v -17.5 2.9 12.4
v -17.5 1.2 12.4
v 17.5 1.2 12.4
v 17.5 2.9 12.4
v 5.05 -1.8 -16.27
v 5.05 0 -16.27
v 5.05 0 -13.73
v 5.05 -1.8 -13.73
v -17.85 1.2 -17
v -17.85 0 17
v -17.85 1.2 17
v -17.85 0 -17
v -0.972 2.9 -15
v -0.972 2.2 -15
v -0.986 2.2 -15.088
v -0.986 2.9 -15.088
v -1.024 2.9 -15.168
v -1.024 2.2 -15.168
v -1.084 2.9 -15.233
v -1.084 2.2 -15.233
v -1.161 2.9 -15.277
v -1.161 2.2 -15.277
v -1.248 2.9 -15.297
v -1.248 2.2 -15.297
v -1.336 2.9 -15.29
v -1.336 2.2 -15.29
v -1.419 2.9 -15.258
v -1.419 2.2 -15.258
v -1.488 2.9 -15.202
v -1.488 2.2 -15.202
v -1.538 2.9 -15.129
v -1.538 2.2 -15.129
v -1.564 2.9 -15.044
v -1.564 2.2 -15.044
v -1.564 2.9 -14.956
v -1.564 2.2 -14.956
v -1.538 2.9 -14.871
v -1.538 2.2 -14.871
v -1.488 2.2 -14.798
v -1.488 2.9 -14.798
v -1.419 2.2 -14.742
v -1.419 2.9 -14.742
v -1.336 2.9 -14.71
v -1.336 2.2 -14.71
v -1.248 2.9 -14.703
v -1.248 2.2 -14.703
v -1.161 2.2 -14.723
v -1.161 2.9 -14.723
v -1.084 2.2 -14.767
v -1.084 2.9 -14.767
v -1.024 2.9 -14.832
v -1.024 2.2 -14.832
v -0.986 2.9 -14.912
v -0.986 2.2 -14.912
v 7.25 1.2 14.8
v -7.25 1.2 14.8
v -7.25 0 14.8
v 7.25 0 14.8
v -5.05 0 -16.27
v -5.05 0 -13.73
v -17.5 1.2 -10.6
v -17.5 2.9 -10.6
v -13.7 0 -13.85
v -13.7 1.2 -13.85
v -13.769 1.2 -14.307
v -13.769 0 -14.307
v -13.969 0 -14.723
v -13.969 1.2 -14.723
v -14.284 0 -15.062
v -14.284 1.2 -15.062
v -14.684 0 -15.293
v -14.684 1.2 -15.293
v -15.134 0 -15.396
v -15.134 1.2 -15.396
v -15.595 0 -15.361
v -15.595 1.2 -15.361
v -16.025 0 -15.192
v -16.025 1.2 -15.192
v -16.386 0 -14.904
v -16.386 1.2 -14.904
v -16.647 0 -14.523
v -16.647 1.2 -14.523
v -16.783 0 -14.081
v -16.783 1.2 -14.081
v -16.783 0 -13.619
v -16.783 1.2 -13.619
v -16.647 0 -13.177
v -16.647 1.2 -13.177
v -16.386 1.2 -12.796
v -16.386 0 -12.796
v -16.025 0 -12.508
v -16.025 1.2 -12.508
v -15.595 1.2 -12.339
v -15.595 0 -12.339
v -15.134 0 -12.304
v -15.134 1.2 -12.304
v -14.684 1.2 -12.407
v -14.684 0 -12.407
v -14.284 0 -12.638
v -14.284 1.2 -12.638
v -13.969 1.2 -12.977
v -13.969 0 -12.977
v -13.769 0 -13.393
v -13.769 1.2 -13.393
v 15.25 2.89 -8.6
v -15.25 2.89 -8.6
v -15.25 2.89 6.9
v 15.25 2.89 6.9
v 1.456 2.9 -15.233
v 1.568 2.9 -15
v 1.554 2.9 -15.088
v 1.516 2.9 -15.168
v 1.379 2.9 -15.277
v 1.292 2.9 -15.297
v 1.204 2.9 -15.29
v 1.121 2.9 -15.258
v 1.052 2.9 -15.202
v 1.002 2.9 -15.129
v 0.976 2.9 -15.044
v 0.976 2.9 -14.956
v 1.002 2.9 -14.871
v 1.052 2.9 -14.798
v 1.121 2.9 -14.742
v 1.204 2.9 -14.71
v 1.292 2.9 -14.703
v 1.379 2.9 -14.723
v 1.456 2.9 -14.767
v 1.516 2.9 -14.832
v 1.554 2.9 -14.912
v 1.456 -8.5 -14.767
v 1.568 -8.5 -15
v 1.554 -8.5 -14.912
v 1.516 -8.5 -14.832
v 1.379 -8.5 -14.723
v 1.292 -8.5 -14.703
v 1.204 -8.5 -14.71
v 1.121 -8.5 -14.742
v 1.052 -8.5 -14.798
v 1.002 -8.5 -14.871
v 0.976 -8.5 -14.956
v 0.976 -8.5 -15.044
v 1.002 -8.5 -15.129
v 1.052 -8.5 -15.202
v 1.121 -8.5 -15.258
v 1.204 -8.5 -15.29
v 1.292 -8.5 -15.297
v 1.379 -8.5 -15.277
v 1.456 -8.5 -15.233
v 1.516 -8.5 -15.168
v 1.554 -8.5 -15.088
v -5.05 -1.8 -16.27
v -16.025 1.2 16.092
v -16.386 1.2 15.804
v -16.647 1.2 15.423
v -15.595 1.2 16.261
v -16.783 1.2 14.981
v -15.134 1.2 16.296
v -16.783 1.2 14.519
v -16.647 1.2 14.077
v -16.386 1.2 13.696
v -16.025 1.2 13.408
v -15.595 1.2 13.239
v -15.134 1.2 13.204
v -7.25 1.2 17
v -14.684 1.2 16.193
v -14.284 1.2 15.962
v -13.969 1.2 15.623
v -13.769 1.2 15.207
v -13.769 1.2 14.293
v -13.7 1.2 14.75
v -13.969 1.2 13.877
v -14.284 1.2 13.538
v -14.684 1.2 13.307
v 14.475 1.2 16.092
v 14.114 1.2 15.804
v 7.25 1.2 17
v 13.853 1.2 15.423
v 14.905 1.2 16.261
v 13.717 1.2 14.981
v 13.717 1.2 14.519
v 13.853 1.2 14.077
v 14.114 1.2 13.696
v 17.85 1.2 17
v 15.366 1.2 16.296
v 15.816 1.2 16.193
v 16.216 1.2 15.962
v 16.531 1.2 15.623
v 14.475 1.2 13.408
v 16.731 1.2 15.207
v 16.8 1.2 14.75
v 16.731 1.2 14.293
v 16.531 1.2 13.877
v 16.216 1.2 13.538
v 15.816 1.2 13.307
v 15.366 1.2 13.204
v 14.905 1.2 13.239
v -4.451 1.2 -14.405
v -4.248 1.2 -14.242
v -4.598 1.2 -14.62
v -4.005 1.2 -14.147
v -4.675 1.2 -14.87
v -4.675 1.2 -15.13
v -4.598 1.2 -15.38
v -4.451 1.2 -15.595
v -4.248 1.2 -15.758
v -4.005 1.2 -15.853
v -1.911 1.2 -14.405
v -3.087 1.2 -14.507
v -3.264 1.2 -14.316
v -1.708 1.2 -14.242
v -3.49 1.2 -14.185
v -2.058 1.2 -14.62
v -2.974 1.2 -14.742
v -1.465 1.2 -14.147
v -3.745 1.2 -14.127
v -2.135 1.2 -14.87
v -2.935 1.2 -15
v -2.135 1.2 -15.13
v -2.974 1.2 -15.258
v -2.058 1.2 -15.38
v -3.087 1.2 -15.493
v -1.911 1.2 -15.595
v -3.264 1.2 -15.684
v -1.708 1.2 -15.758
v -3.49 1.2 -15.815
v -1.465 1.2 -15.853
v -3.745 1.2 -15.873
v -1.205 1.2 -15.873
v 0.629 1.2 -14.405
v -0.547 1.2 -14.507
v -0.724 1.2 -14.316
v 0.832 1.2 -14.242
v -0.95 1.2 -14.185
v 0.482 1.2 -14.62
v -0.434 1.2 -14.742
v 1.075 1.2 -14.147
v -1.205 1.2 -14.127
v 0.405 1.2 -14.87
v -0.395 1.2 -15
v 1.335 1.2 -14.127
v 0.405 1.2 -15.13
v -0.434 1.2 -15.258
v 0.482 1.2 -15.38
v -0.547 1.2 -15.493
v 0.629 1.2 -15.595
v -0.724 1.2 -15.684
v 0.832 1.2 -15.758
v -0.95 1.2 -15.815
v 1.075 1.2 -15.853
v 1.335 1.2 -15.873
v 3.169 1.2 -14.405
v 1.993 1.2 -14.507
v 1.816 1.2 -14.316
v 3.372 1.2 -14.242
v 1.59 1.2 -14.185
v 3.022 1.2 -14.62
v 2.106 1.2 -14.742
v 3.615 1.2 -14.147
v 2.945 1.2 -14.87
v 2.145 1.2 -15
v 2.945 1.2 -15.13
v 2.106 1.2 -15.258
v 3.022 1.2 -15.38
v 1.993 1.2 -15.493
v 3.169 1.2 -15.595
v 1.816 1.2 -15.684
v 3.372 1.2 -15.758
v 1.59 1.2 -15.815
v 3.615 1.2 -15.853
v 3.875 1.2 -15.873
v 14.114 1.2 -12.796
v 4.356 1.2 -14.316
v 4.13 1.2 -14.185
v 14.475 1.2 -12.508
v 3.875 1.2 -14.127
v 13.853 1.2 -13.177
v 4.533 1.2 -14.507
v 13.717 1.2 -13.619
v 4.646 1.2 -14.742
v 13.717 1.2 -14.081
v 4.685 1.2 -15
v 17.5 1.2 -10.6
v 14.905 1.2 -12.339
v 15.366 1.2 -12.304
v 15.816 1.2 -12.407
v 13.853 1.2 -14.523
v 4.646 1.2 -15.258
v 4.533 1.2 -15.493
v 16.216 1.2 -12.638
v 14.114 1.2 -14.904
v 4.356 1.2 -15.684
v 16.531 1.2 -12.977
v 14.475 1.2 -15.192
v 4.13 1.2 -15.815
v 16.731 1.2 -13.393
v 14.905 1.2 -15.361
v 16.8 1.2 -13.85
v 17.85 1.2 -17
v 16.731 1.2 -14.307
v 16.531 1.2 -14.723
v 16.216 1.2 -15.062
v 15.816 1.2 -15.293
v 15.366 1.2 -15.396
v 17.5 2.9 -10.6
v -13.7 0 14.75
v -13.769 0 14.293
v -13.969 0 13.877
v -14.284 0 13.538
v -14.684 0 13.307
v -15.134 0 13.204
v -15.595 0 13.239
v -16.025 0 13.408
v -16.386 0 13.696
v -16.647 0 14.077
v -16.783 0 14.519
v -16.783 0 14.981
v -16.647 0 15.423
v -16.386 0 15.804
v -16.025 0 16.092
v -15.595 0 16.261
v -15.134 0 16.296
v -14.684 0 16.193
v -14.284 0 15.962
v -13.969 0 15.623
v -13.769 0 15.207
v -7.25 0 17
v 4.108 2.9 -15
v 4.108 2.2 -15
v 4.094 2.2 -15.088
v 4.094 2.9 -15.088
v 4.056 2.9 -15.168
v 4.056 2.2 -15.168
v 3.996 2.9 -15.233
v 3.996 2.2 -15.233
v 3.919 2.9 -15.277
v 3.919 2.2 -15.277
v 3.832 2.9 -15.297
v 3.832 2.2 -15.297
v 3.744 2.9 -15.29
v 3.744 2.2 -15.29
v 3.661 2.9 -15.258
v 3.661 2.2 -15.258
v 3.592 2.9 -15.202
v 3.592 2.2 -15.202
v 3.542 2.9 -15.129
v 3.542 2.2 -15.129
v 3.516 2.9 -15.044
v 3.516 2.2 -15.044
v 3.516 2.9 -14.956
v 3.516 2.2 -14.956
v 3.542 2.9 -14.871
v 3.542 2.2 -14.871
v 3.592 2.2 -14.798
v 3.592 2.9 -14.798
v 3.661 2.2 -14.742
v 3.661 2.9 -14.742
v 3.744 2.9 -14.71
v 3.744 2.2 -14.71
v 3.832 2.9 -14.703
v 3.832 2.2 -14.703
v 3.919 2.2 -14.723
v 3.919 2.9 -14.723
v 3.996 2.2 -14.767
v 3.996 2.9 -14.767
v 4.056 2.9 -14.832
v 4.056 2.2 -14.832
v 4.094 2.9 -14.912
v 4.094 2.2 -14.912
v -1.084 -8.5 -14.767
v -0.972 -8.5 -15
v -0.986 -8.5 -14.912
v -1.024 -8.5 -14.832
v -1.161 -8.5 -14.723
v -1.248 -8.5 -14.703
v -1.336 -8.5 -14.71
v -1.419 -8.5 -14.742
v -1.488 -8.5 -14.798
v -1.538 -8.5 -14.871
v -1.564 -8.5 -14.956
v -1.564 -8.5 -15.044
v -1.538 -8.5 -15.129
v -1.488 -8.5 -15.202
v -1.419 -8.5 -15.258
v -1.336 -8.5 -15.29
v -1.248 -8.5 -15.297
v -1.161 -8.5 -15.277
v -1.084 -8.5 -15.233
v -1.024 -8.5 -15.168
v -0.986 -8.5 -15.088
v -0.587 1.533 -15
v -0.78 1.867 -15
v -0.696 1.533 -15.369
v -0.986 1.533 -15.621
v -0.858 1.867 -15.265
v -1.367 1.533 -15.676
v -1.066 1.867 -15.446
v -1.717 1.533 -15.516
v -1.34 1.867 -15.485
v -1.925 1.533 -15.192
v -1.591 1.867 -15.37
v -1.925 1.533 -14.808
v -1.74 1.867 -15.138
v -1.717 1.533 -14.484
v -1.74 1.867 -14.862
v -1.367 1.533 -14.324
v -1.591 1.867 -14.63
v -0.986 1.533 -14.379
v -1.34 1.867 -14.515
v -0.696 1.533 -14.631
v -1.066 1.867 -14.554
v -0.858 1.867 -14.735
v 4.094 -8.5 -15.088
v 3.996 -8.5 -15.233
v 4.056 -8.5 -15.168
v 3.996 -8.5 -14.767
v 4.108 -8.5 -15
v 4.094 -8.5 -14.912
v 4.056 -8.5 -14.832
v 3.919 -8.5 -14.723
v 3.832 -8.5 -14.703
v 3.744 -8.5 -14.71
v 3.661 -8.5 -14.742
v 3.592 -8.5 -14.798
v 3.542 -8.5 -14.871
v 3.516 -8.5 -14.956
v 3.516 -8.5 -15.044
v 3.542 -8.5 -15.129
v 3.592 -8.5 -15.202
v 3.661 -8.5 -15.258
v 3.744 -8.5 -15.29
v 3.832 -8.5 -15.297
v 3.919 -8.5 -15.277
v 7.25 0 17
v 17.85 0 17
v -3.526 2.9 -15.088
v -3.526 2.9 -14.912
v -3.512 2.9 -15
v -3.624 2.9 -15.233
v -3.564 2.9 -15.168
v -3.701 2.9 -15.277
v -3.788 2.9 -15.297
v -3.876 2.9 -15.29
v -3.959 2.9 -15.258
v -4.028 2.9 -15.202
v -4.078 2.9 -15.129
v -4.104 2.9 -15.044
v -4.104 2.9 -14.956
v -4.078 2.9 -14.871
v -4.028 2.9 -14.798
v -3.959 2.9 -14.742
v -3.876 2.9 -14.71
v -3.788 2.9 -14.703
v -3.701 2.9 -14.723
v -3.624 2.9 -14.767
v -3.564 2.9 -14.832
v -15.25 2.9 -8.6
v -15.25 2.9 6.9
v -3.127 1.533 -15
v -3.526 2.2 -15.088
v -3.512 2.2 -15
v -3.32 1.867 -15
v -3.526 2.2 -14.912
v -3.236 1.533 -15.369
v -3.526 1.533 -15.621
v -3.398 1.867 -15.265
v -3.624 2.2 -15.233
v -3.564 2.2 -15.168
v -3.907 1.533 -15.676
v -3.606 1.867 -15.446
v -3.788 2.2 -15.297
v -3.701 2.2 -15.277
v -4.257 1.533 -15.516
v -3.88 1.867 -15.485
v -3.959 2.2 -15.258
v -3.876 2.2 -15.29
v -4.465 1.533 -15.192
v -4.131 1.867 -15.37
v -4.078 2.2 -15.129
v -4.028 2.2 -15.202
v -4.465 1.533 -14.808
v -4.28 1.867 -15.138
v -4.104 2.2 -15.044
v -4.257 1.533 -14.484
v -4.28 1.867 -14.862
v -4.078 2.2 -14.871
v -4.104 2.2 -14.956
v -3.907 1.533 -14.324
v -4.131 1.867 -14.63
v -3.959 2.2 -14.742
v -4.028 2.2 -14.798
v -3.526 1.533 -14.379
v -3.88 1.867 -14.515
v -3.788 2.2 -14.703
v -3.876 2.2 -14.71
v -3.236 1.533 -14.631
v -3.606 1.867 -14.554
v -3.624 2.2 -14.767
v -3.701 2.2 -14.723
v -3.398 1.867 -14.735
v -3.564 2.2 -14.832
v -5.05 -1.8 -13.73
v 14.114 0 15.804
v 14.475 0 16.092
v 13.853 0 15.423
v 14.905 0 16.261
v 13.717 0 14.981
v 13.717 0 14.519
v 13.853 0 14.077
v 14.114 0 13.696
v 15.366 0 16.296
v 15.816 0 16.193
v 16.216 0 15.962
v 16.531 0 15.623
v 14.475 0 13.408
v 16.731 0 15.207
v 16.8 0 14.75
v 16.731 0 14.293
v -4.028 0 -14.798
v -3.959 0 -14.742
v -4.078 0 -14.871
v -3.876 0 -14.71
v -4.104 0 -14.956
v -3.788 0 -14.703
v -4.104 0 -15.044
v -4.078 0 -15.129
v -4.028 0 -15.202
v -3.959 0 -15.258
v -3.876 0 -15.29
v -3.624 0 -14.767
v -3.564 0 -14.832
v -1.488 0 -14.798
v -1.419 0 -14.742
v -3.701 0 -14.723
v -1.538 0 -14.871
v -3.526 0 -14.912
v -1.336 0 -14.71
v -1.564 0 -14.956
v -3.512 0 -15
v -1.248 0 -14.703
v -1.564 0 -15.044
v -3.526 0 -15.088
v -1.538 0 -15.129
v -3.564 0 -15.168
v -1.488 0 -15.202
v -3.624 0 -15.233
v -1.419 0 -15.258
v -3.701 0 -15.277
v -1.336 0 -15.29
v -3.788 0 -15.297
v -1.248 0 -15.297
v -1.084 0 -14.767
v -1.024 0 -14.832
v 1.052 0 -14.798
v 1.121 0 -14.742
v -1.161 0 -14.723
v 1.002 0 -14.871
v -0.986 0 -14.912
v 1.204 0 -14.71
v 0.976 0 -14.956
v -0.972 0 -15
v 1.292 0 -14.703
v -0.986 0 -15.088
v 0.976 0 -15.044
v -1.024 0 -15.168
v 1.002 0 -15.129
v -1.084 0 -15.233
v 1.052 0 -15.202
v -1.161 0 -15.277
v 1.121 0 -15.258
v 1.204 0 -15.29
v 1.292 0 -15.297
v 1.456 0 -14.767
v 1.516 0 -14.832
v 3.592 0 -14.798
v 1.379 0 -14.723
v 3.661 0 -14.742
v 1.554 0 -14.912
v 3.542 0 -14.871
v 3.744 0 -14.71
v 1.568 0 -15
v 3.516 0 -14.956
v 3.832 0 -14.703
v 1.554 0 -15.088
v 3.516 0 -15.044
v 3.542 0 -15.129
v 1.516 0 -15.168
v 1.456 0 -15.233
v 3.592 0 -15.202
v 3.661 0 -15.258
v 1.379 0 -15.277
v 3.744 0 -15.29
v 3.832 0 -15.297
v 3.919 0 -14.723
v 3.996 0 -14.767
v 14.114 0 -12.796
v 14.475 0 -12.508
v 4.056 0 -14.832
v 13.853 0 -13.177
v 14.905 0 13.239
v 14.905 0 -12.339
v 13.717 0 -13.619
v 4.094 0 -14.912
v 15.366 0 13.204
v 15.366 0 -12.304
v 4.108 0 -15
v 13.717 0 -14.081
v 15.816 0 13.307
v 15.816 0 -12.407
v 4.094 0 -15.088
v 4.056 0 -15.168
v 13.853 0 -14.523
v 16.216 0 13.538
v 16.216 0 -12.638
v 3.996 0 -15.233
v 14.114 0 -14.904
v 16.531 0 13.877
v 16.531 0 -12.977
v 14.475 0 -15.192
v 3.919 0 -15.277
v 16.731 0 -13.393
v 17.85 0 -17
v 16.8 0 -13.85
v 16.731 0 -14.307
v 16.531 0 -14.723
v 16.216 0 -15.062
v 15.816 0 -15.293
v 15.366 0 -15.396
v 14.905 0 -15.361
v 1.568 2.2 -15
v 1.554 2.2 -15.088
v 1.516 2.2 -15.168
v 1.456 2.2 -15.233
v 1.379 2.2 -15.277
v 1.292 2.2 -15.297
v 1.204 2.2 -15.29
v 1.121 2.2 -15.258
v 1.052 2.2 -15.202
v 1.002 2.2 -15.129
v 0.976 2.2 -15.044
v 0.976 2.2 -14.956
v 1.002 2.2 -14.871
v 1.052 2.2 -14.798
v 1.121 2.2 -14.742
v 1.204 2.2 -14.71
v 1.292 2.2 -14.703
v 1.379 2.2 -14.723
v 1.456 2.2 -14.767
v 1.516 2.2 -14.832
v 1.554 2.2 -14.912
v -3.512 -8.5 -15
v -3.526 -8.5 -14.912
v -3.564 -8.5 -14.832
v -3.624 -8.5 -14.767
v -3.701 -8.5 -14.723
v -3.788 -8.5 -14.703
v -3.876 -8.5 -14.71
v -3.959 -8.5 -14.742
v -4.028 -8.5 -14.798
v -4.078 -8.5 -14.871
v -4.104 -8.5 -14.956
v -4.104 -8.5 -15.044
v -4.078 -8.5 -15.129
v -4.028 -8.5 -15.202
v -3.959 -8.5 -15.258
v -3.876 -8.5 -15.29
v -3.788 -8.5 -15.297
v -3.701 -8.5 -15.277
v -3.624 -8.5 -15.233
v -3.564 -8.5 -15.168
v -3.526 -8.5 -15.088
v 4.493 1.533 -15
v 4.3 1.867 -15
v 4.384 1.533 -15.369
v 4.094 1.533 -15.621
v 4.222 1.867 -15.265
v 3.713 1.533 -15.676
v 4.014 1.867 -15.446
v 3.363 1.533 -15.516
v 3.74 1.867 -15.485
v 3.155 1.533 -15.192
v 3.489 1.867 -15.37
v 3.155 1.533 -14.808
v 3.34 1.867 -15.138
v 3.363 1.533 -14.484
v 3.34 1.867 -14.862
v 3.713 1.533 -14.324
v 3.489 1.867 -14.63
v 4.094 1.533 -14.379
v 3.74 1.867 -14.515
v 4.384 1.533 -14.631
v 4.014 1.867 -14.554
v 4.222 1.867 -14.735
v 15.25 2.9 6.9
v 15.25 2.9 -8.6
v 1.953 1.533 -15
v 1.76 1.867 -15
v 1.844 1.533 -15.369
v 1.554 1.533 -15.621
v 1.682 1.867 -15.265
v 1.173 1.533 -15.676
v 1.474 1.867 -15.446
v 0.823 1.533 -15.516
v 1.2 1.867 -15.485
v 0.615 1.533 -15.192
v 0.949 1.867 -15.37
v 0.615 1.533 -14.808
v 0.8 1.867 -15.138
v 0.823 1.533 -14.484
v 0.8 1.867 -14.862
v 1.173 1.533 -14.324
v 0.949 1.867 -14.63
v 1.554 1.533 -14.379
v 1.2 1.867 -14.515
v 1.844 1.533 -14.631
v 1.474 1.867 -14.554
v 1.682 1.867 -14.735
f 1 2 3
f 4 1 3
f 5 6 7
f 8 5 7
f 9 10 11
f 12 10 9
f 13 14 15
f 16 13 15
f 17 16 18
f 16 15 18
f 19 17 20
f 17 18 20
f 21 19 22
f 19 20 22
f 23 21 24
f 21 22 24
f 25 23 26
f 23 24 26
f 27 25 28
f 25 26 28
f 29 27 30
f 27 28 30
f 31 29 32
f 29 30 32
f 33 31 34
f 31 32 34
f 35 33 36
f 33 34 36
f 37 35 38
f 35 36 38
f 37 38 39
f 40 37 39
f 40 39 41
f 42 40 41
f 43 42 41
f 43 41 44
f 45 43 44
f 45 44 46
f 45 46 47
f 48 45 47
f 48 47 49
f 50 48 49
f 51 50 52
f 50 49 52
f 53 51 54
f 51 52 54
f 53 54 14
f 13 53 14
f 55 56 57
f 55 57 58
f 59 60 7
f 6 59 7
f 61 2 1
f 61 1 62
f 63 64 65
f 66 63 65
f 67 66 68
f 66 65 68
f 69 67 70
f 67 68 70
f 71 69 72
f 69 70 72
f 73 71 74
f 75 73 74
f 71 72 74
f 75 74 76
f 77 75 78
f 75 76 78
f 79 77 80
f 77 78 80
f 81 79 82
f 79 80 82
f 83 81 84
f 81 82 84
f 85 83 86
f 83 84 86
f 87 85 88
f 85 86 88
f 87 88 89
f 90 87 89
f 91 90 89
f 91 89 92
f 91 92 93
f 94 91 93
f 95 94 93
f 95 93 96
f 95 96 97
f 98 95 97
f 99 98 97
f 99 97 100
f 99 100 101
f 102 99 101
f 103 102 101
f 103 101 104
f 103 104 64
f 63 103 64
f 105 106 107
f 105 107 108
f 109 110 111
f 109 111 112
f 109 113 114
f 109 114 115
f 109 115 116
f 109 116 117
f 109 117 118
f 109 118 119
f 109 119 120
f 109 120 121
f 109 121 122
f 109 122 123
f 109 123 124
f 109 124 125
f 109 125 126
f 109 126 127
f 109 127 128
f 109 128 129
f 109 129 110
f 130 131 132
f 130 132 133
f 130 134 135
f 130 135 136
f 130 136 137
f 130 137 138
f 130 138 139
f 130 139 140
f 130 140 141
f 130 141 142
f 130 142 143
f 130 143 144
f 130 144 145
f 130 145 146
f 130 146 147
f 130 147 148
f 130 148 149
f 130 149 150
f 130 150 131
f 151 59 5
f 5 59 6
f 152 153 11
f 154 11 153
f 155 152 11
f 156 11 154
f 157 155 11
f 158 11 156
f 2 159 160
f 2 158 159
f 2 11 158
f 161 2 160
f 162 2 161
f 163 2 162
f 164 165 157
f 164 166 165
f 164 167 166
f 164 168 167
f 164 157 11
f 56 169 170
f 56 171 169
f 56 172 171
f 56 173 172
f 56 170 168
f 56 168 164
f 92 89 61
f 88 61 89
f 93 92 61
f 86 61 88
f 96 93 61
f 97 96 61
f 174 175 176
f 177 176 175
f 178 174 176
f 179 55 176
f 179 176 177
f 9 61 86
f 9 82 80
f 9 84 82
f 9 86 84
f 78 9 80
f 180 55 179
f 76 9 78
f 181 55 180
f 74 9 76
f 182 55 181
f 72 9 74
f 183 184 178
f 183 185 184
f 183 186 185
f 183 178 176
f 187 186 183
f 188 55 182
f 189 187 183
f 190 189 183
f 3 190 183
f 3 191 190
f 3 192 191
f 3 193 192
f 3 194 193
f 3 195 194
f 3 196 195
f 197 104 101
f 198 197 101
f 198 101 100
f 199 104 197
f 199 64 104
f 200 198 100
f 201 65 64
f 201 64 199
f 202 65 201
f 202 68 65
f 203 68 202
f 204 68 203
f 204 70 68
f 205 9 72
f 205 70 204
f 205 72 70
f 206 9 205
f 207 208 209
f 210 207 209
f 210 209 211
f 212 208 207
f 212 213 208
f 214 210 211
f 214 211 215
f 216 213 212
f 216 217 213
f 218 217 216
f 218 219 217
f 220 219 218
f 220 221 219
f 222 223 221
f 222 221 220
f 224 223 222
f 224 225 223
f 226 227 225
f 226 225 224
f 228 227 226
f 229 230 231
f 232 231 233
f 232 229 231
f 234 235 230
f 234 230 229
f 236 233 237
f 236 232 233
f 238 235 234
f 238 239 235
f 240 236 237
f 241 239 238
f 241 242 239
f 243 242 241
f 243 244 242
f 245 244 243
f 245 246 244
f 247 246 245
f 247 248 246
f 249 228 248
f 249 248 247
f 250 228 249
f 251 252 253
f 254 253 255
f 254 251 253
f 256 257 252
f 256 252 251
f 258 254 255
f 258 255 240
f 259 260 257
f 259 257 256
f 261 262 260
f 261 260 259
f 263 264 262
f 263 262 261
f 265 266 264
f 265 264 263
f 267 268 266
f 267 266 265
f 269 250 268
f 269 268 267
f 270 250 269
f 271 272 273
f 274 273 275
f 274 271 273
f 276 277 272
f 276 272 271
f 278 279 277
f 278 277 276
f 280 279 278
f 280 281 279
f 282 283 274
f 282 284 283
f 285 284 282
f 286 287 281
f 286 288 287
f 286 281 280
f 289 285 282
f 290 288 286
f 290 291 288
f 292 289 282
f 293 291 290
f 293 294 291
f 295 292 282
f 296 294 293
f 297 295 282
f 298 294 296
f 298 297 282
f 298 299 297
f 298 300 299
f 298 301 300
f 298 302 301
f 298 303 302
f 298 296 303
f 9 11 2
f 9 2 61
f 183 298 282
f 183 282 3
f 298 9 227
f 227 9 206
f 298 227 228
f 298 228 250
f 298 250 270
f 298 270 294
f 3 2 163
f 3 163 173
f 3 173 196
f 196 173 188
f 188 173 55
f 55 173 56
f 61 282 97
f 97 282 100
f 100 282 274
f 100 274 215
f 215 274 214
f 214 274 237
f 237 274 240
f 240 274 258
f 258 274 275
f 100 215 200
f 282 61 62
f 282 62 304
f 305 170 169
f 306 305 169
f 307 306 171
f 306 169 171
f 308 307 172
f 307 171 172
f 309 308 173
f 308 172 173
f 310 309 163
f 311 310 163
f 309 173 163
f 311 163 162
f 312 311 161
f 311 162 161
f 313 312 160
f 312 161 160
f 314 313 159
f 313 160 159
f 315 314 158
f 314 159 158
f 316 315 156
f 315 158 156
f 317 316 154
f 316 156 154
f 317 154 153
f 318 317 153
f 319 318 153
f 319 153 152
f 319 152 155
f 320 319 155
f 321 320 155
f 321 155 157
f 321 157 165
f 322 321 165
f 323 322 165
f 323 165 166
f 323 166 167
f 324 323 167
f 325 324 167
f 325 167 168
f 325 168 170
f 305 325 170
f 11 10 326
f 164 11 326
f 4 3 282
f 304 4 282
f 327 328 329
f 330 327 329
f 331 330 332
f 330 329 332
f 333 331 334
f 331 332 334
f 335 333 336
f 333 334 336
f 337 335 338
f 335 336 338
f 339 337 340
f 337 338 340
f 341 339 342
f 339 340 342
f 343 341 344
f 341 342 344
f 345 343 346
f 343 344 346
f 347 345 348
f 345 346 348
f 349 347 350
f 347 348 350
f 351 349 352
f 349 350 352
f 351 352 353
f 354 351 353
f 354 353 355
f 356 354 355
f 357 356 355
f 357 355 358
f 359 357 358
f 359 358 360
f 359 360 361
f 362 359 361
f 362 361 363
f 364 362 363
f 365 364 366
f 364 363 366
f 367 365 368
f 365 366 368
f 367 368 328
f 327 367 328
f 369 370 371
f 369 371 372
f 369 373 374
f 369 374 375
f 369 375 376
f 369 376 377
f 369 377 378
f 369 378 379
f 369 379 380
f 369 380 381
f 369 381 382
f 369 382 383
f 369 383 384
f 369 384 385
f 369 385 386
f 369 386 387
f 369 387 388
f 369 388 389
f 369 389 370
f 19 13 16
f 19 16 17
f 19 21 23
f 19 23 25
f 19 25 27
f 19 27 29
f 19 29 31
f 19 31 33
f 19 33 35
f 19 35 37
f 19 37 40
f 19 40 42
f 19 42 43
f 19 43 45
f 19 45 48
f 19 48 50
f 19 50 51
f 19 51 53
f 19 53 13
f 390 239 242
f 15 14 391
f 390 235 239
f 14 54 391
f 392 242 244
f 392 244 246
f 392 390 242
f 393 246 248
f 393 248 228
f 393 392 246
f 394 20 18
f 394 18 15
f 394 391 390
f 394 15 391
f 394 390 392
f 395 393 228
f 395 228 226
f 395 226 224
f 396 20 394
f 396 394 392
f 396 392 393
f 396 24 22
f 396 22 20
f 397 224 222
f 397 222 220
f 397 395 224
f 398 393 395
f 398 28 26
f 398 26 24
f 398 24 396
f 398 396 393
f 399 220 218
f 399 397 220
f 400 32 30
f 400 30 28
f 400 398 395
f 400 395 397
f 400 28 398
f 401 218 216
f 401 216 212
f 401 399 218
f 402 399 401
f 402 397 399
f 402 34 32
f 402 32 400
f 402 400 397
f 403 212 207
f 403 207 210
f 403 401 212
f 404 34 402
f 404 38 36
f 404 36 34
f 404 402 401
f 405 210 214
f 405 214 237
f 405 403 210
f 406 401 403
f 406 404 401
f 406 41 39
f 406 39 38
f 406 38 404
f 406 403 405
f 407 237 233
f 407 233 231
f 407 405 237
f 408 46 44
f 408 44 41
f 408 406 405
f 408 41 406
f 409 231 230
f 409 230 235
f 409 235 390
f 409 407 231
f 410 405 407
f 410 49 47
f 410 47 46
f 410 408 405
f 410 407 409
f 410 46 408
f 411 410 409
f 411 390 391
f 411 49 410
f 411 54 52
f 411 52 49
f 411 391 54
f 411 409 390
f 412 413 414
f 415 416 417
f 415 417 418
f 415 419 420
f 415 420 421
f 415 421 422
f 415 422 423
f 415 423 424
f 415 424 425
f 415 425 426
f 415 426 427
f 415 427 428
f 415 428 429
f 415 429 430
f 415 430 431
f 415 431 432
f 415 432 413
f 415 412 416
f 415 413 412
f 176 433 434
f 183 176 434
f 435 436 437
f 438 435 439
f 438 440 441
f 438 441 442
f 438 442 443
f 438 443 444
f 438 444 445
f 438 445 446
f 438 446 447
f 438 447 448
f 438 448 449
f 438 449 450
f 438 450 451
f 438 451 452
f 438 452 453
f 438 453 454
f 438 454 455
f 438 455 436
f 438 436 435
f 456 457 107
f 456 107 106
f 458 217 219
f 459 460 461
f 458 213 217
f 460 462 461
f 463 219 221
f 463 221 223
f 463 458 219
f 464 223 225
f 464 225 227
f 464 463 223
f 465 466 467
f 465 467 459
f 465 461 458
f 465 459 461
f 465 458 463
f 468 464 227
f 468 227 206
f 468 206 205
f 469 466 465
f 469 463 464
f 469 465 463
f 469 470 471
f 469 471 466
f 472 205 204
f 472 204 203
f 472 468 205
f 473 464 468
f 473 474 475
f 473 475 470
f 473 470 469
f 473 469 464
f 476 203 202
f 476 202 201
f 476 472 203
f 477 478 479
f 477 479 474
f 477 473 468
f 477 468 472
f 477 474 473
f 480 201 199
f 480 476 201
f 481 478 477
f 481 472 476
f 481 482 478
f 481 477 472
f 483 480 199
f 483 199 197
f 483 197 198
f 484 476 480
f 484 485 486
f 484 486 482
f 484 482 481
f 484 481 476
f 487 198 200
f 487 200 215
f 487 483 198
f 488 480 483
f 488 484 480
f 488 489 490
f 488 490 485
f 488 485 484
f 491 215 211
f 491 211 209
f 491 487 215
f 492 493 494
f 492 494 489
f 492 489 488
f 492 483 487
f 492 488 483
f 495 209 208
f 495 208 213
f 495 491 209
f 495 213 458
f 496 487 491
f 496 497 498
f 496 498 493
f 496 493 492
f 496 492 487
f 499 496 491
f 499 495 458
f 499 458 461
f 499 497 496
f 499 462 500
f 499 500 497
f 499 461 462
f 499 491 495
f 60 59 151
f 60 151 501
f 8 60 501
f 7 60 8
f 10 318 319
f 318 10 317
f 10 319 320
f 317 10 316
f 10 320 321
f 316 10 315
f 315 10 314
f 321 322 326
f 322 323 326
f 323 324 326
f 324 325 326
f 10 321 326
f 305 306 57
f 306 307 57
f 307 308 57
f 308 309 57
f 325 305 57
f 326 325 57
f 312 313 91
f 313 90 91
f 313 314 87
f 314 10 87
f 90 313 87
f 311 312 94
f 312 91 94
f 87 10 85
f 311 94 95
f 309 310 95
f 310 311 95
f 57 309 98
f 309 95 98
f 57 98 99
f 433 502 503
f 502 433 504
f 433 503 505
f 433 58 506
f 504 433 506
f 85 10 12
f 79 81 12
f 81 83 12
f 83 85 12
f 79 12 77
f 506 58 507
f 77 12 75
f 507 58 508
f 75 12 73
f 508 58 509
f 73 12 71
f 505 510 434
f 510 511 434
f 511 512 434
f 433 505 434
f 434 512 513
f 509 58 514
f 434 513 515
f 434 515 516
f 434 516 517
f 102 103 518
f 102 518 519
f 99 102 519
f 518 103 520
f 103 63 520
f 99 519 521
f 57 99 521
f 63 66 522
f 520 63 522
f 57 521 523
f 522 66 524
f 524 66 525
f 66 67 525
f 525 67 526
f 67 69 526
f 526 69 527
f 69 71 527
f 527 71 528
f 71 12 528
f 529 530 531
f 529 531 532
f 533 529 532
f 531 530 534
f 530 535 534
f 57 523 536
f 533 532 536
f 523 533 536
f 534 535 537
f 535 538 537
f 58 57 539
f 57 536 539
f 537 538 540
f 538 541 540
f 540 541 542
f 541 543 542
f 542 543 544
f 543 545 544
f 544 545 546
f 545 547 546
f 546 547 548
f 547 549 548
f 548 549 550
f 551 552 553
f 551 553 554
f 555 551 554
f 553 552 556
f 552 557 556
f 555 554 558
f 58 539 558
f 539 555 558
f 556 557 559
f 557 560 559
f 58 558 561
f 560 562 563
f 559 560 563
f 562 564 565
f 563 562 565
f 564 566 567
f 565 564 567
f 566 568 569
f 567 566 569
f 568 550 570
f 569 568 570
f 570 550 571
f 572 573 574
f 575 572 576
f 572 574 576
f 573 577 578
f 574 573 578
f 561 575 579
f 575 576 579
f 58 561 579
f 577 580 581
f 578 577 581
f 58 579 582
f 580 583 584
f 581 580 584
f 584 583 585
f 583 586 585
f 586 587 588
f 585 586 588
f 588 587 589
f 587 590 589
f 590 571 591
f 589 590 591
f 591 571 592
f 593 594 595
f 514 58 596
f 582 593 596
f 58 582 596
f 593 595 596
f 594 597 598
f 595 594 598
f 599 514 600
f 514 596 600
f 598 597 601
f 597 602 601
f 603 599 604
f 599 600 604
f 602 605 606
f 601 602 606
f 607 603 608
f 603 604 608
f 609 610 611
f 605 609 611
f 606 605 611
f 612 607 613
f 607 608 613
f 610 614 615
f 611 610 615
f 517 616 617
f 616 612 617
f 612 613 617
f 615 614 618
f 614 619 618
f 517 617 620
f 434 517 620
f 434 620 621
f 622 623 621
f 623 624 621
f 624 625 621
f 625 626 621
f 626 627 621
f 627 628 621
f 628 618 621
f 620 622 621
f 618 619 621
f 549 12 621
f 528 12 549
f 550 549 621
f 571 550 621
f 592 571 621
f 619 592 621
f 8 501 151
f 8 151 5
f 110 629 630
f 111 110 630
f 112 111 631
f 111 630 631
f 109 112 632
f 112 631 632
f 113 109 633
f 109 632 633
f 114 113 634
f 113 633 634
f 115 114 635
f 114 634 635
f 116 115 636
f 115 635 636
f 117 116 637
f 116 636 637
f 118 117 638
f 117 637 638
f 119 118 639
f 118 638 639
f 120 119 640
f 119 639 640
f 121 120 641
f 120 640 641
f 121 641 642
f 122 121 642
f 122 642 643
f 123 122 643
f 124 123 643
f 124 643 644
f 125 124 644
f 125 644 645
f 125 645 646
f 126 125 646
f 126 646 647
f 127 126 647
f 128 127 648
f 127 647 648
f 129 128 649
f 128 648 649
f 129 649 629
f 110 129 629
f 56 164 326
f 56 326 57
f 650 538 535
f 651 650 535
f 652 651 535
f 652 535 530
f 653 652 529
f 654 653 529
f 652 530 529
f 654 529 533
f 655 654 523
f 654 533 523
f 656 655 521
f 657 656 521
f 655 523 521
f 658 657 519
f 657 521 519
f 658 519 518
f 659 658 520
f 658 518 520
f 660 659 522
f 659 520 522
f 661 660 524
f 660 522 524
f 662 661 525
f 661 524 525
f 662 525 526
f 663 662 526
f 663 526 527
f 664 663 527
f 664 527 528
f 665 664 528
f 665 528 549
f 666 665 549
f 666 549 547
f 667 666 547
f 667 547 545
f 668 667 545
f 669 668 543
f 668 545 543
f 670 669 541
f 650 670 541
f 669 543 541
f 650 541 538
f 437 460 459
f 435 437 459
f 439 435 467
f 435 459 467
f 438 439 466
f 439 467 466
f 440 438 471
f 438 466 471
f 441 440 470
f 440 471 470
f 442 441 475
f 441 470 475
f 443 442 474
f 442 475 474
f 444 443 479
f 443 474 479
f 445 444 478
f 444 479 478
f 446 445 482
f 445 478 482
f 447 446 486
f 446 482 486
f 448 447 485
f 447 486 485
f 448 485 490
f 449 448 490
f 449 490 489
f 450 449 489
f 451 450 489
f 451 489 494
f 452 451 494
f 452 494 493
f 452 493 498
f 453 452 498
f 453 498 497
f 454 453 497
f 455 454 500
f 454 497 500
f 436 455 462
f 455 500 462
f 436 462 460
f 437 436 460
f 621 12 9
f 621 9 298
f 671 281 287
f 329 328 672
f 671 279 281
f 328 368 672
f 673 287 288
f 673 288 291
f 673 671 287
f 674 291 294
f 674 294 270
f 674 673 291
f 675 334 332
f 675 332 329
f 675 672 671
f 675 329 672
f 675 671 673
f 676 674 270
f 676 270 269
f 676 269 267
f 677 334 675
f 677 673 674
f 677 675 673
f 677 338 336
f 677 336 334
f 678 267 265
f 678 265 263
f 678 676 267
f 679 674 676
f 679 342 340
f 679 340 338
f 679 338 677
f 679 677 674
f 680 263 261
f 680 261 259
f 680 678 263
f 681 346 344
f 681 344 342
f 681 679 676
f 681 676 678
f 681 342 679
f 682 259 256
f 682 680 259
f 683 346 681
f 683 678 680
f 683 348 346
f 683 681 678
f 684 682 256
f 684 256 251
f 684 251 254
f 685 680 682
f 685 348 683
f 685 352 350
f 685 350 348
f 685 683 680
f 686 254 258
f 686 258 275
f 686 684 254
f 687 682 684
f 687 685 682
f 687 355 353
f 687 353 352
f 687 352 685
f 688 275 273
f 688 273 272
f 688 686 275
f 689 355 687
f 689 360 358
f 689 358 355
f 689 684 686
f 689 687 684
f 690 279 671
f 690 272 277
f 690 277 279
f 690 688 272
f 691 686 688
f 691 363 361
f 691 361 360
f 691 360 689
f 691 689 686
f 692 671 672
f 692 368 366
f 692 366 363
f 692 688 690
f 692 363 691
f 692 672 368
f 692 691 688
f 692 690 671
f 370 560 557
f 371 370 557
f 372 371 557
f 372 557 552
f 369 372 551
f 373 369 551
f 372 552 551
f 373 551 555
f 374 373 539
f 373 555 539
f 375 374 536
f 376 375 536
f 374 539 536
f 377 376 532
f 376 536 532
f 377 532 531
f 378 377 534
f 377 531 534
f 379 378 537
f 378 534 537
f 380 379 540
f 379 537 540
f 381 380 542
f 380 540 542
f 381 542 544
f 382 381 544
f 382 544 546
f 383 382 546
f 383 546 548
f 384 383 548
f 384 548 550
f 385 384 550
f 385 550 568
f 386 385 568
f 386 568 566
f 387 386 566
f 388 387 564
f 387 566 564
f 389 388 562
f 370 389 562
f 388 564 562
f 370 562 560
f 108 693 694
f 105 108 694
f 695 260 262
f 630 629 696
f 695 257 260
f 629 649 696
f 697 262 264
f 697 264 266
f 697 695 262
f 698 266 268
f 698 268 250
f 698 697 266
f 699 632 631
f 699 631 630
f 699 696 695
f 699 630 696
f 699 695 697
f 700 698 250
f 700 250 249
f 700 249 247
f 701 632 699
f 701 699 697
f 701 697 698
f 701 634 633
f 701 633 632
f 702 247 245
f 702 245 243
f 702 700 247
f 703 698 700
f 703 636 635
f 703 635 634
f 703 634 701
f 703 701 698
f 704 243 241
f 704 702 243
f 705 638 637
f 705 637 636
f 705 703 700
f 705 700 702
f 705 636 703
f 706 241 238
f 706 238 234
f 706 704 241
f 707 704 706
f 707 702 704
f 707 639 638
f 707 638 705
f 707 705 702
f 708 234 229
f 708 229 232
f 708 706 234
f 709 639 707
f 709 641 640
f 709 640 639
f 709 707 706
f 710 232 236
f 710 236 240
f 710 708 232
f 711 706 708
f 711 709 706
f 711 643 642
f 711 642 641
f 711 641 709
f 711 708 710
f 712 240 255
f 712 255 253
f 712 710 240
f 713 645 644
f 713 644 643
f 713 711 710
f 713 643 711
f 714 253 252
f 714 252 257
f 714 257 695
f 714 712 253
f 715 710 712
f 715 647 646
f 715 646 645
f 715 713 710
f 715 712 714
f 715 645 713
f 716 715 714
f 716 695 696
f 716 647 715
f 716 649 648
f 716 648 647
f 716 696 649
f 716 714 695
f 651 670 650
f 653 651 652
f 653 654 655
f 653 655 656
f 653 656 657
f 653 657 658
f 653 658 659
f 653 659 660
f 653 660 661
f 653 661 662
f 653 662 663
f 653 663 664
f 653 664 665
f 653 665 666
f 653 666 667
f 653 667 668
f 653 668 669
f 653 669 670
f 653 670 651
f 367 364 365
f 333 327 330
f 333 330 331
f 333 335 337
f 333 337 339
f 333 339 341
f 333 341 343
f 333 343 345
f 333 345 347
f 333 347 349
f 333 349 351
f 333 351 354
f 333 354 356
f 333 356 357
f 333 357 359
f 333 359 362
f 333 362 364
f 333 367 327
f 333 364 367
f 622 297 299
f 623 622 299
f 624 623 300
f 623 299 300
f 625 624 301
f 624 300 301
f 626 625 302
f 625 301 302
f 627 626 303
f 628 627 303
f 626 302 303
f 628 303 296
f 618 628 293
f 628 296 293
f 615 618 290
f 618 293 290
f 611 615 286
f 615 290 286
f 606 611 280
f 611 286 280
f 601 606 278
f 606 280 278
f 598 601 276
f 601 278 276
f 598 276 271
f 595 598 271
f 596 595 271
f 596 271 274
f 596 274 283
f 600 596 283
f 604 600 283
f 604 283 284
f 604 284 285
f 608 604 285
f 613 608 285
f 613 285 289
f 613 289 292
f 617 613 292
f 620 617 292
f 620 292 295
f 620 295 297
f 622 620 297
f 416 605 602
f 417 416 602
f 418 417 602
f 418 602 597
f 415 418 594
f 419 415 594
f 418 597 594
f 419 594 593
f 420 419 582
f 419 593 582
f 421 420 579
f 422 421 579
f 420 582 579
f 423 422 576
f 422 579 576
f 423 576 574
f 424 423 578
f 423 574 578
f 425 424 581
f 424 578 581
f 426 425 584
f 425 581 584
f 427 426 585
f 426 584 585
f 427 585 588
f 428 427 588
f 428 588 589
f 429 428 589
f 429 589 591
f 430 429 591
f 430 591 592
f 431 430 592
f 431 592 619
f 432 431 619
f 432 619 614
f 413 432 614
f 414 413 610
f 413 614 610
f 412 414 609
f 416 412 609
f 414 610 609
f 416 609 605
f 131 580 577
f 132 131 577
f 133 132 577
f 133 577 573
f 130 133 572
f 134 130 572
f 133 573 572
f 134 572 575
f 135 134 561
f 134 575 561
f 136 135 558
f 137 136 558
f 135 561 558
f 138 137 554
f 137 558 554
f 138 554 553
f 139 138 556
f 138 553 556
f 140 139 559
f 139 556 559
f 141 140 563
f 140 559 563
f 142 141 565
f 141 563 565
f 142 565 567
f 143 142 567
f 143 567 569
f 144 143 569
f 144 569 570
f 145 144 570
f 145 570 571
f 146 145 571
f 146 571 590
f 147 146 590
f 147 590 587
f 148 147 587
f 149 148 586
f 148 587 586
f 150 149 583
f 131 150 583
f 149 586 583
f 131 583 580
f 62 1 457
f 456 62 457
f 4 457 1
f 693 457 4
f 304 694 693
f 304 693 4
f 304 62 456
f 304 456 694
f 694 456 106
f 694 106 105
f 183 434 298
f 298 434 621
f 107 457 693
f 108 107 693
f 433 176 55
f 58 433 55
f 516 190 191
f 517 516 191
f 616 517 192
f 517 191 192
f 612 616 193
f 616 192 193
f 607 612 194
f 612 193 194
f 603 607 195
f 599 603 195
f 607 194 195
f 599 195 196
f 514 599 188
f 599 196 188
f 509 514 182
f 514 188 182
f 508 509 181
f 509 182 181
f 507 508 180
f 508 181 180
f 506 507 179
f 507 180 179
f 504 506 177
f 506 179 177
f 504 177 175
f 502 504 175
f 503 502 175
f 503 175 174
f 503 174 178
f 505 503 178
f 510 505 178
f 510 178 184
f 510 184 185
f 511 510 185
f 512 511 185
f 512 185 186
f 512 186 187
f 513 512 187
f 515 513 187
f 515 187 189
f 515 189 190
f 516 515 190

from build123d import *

# Parameters (mm, degrees)
SKIZZE1_W                       = 35.7
SKIZZE1_H                       = 34
AUFSATZ_LINEAR_AUSTRAGEN1_DEPTH = 1.2
SKIZZE2_R                       = 1.55
SCHNITT_LINEAR_AUSTRAGEN1_DEPTH = 2.2
SKIZZE3_W                       = 35
SKIZZE3_H                       = 23
AUFSATZ_LINEAR_AUSTRAGEN2_DEPTH = 1.7
SKIZZE4_W                       = 30.5
SKIZZE4_H                       = 15.5
SCHNITT_LINEAR_AUSTRAGEN2_DEPTH = 0.01
SKIZZE5_W                       = 14.5
SKIZZE5_H                       = 2.2
SCHNITT_LINEAR_AUSTRAGEN3_DEPTH = 2.2
SKIZZE6_R                       = 0.875
AUFSATZ_LINEAR_AUSTRAGEN3_DEPTH = 1
AUFSATZ_LINEAR_AUSTRAGEN3_TAPER = 30
SKIZZE7_R                       = 0.297649731
AUFSATZ_LINEAR_AUSTRAGEN4_DEPTH = 0.7
SKIZZE8_R                       = 0.297649731
AUFSATZ_LINEAR_AUSTRAGEN5_DEPTH = 8.5
SKIZZE9_W                       = 10.1
SKIZZE9_H                       = 2.54
AUFSATZ_LINEAR_AUSTRAGEN6_DEPTH = 1.8


with BuildPart() as part:
    # Skizze1 → Aufsatz-Linear austragen1 (new body)
    with BuildSketch(Plane(origin=(0, 0, 0), x_dir=(1, 0, 0), z_dir=(0, 1, 0))):
        Rectangle(SKIZZE1_W, SKIZZE1_H)
    extrude(amount=AUFSATZ_LINEAR_AUSTRAGEN1_DEPTH)

    # Skizze2 → Schnitt-Linear austragen1 (cut, through all)
    with BuildSketch(Plane(origin=(0, 1.2, 0), x_dir=(1, 0, 0), z_dir=(0, 1, 0))):
        with Locations((-15.25, 13.85)):
            Circle(SKIZZE2_R)
        with Locations((15.25, 13.85)):
            Circle(SKIZZE2_R)
        with Locations((15.25, -14.75)):
            Circle(SKIZZE2_R)
        with Locations((-15.25, -14.75)):
            Circle(SKIZZE2_R)
    extrude(amount=-SCHNITT_LINEAR_AUSTRAGEN1_DEPTH, mode=Mode.SUBTRACT)

    # Skizze3 → Aufsatz-Linear austragen2 (add)
    with BuildSketch(Plane(origin=(0, 1.2, 0), x_dir=(1, 0, 0), z_dir=(0, 1, 0))):
        with Locations((0, -0.9)):
            Rectangle(SKIZZE3_W, SKIZZE3_H)
    extrude(amount=AUFSATZ_LINEAR_AUSTRAGEN2_DEPTH)

    # Skizze4 → Schnitt-Linear austragen2 (cut)
    with BuildSketch(Plane(origin=(0, 2.9, 0), x_dir=(1, 0, 0), z_dir=(0, 1, 0))):
        with Locations((0, 0.85)):
            Rectangle(SKIZZE4_W, SKIZZE4_H)
    extrude(amount=-SCHNITT_LINEAR_AUSTRAGEN2_DEPTH, mode=Mode.SUBTRACT)

    # Skizze5 → Schnitt-Linear austragen3 (cut, through all)
    with BuildSketch(Plane(origin=(0, 1.2, 0), x_dir=(1, 0, 0), z_dir=(0, 1, 0))):
        with Locations((0, -15.9)):
            Rectangle(SKIZZE5_W, SKIZZE5_H)
    extrude(amount=-SCHNITT_LINEAR_AUSTRAGEN3_DEPTH, mode=Mode.SUBTRACT)

    # Skizze6 → Aufsatz-Linear austragen3 (add)
    with BuildSketch(Plane(origin=(0, 1.2, 0), x_dir=(1, 0, 0), z_dir=(0, 1, 0))):
        with Locations((-3.81, 15)):
            Circle(SKIZZE6_R)
        with Locations((3.81, 15)):
            Circle(SKIZZE6_R)
        with Locations((1.27, 15)):
            Circle(SKIZZE6_R)
        with Locations((-1.27, 15)):
            Circle(SKIZZE6_R)
    extrude(amount=AUFSATZ_LINEAR_AUSTRAGEN3_DEPTH, taper=AUFSATZ_LINEAR_AUSTRAGEN3_TAPER)

    # Skizze7 → Aufsatz-Linear austragen4 (add)
    with BuildSketch(Plane(origin=(0, 2.2, 0), x_dir=(1, 0, 0), z_dir=(0, 1, 0))):
        with Locations((-3.81, 15)):
            Circle(SKIZZE7_R)
        with Locations((-1.27, 15)):
            Circle(SKIZZE7_R)
        with Locations((1.27, 15)):
            Circle(SKIZZE7_R)
        with Locations((3.81, 15)):
            Circle(SKIZZE7_R)
    extrude(amount=AUFSATZ_LINEAR_AUSTRAGEN4_DEPTH)

    # Skizze8 → Aufsatz-Linear austragen5 (add)
    with BuildSketch(Plane.XZ):
        with Locations((-1.27, -15)):
            Circle(SKIZZE8_R)
        with Locations((-3.81, -15)):
            Circle(SKIZZE8_R)
        with Locations((1.27, -15)):
            Circle(SKIZZE8_R)
        with Locations((3.81, -15)):
            Circle(SKIZZE8_R)
    extrude(amount=AUFSATZ_LINEAR_AUSTRAGEN5_DEPTH)


with BuildPart() as body_2:
    # Skizze9 → Aufsatz-Linear austragen6 (new body)
    with BuildSketch(Plane.XZ):
        with Locations((0, -15)):
            Rectangle(SKIZZE9_W, SKIZZE9_H)
    extrude(amount=AUFSATZ_LINEAR_AUSTRAGEN6_DEPTH)


solid = Compound([part.part, body_2.part])
